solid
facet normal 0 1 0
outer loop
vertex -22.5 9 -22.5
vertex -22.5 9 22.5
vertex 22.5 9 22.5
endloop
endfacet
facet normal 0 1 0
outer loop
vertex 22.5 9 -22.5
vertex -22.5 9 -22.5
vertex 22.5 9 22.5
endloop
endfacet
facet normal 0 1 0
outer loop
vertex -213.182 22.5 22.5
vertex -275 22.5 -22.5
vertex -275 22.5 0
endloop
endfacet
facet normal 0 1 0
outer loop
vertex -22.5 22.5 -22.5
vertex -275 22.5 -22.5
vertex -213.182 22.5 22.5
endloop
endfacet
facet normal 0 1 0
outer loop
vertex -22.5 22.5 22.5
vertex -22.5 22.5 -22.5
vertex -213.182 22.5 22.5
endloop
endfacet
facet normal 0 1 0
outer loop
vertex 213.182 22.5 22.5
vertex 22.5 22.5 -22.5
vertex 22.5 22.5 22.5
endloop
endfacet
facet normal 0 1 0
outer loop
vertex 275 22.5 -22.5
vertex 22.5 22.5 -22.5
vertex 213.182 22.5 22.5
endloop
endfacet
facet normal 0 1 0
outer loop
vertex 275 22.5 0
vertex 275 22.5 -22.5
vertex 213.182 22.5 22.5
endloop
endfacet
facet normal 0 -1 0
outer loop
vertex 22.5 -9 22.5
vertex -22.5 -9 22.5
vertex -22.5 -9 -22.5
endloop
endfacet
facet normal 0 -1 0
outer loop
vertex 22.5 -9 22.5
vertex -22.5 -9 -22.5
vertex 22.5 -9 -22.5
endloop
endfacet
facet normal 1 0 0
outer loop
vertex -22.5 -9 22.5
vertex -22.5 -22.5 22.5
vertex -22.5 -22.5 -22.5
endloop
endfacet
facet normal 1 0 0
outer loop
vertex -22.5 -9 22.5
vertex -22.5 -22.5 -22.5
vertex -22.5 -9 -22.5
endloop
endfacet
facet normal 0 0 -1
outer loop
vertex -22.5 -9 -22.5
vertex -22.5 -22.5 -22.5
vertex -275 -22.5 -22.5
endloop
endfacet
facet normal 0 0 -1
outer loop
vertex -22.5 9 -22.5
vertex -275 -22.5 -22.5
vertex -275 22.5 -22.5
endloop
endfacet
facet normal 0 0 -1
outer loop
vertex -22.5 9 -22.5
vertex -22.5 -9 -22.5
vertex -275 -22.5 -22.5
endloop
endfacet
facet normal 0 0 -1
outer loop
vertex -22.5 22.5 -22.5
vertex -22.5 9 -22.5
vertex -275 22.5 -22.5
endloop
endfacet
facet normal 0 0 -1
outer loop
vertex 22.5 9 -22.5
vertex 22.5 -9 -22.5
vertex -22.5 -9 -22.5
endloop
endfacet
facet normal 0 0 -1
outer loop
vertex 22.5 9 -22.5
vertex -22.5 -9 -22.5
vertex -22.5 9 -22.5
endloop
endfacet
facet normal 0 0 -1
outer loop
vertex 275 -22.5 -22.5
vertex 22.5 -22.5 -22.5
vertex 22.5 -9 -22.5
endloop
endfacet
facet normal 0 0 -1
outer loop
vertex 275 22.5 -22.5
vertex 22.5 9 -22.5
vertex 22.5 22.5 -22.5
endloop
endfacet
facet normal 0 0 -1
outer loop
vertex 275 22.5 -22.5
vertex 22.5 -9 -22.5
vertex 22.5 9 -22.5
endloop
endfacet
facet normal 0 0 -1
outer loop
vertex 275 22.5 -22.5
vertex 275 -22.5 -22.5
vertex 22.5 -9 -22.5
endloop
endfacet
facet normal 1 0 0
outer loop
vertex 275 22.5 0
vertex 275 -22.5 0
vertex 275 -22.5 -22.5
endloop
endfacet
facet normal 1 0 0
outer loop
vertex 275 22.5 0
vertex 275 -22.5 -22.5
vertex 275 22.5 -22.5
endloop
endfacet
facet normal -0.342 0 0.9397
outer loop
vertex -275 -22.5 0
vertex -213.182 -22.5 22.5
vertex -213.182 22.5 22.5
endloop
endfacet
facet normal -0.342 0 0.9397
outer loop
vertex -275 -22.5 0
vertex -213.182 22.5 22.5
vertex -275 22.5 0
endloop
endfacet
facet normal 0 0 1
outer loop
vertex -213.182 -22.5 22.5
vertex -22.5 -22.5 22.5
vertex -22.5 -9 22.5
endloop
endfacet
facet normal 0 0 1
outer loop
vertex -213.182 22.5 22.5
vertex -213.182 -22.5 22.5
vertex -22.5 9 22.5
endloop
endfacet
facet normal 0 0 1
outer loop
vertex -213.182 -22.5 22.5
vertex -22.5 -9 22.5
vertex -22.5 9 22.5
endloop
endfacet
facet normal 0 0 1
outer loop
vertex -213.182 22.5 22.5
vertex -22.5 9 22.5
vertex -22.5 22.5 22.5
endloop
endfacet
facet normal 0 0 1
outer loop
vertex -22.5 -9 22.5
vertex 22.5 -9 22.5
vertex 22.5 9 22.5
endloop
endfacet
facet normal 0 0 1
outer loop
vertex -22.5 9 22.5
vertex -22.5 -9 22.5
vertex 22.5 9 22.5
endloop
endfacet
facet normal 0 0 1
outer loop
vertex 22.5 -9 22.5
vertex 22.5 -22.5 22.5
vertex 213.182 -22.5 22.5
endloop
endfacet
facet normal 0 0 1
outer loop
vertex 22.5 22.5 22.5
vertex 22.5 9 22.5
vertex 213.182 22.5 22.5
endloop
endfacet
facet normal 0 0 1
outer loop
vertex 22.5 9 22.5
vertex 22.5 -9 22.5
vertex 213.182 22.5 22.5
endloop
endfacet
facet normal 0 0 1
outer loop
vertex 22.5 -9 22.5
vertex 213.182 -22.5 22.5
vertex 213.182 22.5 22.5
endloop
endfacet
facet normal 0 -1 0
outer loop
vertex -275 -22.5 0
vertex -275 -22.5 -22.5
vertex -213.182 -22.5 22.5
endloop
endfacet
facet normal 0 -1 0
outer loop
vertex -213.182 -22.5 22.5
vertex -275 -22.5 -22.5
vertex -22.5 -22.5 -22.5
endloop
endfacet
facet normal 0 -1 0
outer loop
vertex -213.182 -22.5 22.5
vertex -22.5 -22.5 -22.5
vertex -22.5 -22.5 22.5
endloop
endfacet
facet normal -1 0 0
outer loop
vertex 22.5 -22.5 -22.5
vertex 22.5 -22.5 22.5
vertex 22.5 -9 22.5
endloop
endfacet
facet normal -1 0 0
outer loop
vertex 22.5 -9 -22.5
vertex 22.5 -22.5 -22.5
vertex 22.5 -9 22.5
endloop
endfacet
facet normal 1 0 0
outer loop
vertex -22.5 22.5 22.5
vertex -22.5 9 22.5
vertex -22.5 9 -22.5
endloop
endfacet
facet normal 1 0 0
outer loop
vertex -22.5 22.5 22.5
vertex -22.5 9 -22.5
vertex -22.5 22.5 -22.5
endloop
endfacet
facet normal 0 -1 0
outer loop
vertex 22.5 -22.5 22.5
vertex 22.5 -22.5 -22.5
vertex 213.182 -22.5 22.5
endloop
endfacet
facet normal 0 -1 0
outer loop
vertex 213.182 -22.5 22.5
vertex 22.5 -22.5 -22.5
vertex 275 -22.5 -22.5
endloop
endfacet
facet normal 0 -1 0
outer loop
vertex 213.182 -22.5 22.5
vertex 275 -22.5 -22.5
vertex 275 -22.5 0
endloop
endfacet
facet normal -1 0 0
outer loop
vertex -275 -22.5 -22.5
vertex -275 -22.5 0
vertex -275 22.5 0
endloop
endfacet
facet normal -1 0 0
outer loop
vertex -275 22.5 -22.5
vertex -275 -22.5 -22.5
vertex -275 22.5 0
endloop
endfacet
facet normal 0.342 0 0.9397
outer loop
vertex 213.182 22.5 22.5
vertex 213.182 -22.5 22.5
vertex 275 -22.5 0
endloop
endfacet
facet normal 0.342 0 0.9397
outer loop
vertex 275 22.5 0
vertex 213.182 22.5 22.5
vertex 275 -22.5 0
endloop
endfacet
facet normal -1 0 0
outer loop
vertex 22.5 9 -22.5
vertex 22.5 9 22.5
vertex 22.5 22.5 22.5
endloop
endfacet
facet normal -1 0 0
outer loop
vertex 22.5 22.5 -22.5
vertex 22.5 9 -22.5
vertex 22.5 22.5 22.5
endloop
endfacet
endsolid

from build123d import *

# Parameters (mm, degrees)
F0_W     = 45
F0_H     = 45
F1_DEPTH = 275
F2_W     = 45
F2_H     = 13.5
F3_DEPTH = 45.001
F5_DEPTH = 45.001


# Not quite as in the source:
# - a pattern or mirror of a feature is missing from the dataset's text; its kind, count and spacing are read off the source's solid


with BuildPart() as f1:
    # F0 (on Right) → F1 (new body, symmetric)
    with BuildSketch(Plane.YZ):
        Rectangle(F0_W, F0_H)
    extrude(amount=F1_DEPTH, both=True)

    # F2 (on face) → F3 (cut, through all)
    with BuildSketch(Plane.XY.offset(22.5)):
        with Locations((0, 15.75)):
            Rectangle(F2_W, F2_H)
        with Locations((0, -15.75)):
            Rectangle(F2_W, F2_H)
    extrude(amount=-F3_DEPTH, mode=Mode.SUBTRACT)

    # F4 (on face) → F5 (cut, through all)
    with BuildSketch(Plane.XZ.offset(22.5)):
        Polygon((275, 22.5), (213.1817580623, 22.5), (275, 0), align=None)
    f5 = extrude(amount=-F5_DEPTH, mode=Mode.SUBTRACT)

    # F5_copies: F5 across plane
    add(f5.mirror(Plane(origin=(0, 0, 0), x_dir=(0, 0, -1), z_dir=(-1, 0, 0))), mode=Mode.SUBTRACT)


solid = f1.part
